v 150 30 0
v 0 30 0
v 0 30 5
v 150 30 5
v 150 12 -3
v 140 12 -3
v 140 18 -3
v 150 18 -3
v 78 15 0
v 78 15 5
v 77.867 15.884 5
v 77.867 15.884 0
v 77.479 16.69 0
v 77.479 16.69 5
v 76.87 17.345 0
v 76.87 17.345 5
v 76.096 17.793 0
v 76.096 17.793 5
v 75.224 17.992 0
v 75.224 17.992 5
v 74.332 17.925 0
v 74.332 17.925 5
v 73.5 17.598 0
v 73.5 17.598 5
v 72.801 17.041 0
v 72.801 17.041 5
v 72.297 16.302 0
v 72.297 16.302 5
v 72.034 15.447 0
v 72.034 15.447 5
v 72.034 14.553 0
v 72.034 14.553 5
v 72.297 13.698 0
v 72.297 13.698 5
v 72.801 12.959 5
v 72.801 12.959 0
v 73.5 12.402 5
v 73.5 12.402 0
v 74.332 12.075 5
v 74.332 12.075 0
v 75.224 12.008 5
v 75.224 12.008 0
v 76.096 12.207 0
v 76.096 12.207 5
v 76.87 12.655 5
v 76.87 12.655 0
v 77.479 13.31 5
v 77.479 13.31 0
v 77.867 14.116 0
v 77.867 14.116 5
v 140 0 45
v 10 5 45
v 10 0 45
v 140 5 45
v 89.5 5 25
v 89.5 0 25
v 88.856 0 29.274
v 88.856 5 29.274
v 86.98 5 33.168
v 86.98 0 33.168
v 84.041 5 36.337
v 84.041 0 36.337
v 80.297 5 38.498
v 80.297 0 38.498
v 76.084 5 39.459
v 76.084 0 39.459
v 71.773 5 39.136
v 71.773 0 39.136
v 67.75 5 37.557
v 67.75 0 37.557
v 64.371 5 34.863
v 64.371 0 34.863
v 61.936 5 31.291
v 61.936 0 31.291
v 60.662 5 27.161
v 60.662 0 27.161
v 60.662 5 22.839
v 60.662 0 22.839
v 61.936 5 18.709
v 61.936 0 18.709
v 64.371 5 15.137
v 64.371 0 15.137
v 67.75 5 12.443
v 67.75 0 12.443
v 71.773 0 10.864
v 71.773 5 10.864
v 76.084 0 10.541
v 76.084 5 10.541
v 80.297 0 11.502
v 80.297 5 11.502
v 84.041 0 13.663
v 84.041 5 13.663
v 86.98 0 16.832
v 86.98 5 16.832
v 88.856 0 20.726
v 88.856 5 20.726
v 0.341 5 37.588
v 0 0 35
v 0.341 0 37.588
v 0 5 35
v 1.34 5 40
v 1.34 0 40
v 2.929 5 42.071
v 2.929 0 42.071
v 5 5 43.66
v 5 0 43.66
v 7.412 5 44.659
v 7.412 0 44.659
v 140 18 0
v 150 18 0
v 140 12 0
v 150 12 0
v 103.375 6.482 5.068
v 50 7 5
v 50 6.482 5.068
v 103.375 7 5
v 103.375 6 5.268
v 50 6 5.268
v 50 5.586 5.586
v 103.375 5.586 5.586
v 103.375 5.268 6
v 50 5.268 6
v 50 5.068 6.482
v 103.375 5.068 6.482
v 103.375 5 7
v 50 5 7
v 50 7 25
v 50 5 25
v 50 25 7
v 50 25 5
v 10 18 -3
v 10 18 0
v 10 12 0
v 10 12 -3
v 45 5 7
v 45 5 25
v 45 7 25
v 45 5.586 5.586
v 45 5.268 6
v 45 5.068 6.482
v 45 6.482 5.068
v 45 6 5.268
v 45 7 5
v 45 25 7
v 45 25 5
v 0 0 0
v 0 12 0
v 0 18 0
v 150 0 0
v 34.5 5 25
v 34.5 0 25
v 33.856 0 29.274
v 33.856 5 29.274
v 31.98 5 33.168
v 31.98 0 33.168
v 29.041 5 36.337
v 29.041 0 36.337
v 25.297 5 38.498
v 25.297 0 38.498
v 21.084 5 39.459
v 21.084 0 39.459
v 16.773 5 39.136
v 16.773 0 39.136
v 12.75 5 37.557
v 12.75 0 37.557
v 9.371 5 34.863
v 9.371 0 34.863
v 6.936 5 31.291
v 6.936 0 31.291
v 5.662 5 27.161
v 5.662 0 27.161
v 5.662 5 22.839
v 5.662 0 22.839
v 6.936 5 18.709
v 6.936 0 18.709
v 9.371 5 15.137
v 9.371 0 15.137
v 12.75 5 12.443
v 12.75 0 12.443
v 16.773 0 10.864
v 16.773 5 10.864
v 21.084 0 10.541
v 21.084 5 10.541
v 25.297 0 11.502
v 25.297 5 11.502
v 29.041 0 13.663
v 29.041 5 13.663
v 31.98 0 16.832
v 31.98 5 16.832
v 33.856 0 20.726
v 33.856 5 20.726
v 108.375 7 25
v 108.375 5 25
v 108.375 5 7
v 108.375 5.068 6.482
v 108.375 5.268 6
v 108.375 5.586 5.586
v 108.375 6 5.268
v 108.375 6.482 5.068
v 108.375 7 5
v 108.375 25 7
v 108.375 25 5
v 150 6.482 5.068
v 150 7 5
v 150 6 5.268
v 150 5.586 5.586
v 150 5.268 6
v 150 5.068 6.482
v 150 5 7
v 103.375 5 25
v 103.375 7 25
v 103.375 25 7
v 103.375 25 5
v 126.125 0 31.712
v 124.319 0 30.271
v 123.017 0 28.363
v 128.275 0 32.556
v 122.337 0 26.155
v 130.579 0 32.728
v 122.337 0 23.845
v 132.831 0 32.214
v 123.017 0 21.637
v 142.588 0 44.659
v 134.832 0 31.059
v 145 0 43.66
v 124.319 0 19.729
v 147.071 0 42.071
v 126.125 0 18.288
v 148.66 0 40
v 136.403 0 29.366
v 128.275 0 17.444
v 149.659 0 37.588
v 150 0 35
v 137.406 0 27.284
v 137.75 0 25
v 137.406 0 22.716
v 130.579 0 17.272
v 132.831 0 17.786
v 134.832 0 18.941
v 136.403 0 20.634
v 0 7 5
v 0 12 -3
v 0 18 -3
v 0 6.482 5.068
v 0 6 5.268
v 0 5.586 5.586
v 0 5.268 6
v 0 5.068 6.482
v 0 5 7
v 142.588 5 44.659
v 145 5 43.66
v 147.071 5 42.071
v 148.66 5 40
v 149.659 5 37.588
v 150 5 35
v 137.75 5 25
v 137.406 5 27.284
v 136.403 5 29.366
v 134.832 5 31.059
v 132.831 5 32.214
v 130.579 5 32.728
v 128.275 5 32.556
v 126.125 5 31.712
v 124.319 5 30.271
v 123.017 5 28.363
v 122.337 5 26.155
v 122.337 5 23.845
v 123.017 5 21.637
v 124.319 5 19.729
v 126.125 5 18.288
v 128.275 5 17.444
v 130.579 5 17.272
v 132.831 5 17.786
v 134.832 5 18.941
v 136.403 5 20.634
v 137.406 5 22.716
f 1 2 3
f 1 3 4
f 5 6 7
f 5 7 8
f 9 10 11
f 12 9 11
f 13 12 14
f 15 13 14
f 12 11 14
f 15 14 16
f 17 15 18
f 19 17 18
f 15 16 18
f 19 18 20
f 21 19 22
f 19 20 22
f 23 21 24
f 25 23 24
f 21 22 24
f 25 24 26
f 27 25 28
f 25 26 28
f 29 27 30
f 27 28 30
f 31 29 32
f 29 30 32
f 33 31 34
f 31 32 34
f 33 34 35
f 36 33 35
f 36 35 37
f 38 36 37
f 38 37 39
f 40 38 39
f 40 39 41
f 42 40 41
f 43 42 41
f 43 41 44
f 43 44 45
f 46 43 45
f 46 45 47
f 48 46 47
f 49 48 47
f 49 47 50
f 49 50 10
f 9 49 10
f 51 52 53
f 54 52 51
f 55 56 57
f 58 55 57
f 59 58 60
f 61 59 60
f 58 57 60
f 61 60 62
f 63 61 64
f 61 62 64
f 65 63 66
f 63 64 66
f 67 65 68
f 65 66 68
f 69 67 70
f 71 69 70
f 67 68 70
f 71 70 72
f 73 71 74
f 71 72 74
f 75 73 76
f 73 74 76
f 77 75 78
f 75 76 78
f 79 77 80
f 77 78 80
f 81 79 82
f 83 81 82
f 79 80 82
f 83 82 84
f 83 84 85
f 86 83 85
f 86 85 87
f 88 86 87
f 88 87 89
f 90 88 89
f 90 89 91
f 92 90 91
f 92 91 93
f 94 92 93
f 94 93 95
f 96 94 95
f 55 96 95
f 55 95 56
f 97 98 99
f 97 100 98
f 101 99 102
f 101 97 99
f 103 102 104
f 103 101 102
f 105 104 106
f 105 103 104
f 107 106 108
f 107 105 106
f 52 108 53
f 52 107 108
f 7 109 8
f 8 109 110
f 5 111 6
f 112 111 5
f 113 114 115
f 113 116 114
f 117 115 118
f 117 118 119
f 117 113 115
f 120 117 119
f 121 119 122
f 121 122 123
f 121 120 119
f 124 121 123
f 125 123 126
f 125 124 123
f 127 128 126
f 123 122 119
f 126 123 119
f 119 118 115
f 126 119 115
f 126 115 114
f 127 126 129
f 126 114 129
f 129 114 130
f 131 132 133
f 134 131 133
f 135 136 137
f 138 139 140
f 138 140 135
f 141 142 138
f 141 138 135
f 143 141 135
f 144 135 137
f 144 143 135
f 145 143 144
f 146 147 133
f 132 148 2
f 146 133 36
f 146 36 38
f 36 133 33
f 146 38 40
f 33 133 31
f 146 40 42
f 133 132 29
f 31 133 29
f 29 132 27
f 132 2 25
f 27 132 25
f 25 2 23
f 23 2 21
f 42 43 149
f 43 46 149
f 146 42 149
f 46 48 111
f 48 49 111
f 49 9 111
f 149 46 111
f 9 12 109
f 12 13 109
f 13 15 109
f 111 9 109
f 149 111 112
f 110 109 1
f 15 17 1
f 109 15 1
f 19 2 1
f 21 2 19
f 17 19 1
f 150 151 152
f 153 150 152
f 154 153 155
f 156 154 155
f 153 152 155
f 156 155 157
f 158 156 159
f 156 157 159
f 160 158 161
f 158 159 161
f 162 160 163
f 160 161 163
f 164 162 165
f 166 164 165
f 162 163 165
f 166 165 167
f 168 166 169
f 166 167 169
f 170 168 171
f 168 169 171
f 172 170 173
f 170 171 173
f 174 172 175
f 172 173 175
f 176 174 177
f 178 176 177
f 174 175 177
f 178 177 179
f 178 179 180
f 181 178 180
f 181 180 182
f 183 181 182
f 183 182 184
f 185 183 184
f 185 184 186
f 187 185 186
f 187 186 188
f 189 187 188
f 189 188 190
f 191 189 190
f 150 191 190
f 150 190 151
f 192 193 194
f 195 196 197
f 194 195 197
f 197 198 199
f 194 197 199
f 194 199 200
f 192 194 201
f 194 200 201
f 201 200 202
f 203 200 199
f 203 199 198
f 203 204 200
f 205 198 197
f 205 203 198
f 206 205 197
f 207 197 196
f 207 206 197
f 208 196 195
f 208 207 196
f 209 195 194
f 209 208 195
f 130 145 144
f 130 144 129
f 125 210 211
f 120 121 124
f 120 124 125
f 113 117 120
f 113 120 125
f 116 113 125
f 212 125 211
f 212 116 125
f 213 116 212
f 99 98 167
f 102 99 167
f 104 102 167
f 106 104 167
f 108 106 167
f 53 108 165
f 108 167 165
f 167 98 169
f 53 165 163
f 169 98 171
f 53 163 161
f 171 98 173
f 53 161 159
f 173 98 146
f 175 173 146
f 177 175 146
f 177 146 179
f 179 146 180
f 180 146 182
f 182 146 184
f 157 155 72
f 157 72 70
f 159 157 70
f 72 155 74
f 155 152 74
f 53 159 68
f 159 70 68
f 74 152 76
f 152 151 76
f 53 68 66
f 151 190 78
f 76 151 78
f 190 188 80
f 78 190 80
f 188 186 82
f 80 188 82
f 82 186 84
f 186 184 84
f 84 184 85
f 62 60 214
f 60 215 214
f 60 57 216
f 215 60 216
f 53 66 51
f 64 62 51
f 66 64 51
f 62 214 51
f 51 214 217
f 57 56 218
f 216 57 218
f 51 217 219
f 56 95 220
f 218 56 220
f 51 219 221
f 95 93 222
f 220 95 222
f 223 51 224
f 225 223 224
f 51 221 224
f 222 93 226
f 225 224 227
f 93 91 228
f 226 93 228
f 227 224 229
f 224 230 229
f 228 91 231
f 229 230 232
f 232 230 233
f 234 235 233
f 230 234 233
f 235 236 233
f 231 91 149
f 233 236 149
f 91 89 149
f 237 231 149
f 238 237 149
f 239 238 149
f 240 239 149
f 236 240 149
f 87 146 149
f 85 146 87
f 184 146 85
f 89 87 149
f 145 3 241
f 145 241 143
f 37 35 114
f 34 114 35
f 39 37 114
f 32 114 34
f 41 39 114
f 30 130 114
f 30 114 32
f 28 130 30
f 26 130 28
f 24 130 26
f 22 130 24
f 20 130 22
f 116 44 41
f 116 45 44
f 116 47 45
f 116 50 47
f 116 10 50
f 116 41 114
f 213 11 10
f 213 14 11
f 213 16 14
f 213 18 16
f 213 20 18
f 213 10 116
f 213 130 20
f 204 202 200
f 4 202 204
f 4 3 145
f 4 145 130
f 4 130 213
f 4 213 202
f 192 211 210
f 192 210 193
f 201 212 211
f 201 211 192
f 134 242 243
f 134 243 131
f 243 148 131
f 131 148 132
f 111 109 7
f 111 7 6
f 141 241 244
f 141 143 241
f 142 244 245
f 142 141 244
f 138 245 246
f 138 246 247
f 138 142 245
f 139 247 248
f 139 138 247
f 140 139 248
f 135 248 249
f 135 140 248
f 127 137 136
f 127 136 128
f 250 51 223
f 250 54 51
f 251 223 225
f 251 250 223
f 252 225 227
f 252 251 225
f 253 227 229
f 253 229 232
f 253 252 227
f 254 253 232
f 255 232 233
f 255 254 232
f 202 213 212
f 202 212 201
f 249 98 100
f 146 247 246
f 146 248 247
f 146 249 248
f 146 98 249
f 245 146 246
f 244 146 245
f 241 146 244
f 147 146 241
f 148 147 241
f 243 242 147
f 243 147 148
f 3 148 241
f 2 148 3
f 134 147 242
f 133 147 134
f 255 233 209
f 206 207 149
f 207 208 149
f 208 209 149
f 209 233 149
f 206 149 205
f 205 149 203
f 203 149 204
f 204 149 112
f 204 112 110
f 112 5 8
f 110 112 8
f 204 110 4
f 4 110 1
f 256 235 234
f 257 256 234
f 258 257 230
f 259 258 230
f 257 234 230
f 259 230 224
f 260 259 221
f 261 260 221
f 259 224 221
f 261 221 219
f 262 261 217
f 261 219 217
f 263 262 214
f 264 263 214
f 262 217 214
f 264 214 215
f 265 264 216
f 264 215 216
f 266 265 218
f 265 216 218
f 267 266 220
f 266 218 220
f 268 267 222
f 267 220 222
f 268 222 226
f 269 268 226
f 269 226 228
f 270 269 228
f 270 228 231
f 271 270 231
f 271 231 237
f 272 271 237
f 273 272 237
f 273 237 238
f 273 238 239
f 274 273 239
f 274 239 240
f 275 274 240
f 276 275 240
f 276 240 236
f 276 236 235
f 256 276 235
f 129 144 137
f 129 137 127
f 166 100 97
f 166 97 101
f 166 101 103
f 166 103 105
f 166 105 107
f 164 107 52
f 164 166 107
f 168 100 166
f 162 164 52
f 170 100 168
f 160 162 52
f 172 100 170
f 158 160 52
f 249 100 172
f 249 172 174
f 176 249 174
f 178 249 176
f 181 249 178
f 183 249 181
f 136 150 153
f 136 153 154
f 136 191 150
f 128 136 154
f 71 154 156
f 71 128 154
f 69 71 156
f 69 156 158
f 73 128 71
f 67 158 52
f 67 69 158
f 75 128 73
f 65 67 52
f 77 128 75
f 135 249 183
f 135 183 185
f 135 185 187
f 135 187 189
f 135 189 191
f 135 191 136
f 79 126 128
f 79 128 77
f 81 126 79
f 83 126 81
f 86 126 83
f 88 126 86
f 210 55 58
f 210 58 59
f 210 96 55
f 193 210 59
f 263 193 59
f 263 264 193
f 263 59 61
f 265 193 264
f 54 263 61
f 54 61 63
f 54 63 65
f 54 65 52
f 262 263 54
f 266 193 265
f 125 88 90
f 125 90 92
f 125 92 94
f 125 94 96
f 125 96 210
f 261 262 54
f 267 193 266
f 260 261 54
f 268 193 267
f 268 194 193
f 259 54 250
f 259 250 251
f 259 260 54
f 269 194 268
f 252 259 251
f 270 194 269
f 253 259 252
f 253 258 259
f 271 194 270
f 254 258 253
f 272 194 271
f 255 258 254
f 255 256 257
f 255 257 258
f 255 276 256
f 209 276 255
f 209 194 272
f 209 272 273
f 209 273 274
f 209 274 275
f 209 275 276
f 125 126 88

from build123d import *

# Parameters (mm, degrees)
SKETCH_W        = 150
SKETCH_H        = 30
PAD_DEPTH       = 5
SKETCH001_W     = 150
SKETCH001_H     = 5
PAD001_DEPTH    = 40
SKETCH002_R     = 14.5
SKETCH002_R_2   = 7.75
POCKET_DEPTH    = 30.001
FILLET_R        = 10
SKETCH003_W     = 10
SKETCH003_H     = 6
PAD002_DEPTH    = 3
SKETCH004_R     = 3
POCKET001_DEPTH = 8.001
SKETCH005_W     = 5
SKETCH005_H     = 20
PAD003_DEPTH    = 20
CHAMFER_SIZE    = 18
FILLET001_R     = 2


with BuildPart() as part:
    # Sketch → Pad (new body)
    with BuildSketch(Plane.XY):
        with Locations((75, 15)):
            Rectangle(SKETCH_W, SKETCH_H)
    extrude(amount=PAD_DEPTH)

    # Sketch001 (on Face6 of Pad) → Pad001 (join)
    with BuildSketch(Plane.XY.offset(5)):
        with Locations((75, 2.5)):
            Rectangle(SKETCH001_W, SKETCH001_H)
    extrude(amount=PAD001_DEPTH)

    # Sketch002 (on Face5 of Pad001) → Pocket (cut, through all)
    with BuildSketch(Plane.XZ):
        with Locations((20, 25)):
            Circle(SKETCH002_R)
        with Locations((75, 25)):
            Circle(SKETCH002_R)
        with Locations((130, 25)):
            Circle(SKETCH002_R_2)
    extrude(amount=-POCKET_DEPTH, mode=Mode.SUBTRACT)

    # Fillet
    fillet_edges = [part.edges().sort_by_distance(p)[0] for p in [
        (150, 2.5, 45),
        (0, 2.5, 45),
    ]]
    fillet(fillet_edges, radius=FILLET_R)

    # Sketch003 → Pad002 (join)
    with BuildSketch(Plane(origin=(0, 0, 0), x_dir=(1, 0, 0), z_dir=(0, 0, -1))):
        with Locations((5, -15)):
            Rectangle(SKETCH003_W, SKETCH003_H)
        with Locations((145, -15)):
            Rectangle(SKETCH003_W, SKETCH003_H)
    extrude(amount=PAD002_DEPTH)

    # Sketch004 (on Face15 of Pad002) → Pocket001 (cut, through all)
    with BuildSketch(Plane.XY.offset(5)):
        with Locations((75, 15)):
            Circle(SKETCH004_R)
    extrude(amount=-POCKET001_DEPTH, mode=Mode.SUBTRACT)

    # Sketch005 (on Face15 of Pocket001) → Pad003 (join)
    with BuildSketch(Plane.XY.offset(5)):
        with Locations((47.5, 15)):
            Rectangle(SKETCH005_W, SKETCH005_H)
        with Locations((105.875, 15)):
            Rectangle(SKETCH005_W, SKETCH005_H)
    extrude(amount=PAD003_DEPTH)

    # Chamfer
    chamfer_edges = [part.edges().sort_by_distance(p)[0] for p in [
        (105.875, 25, 25),
        (47.5, 25, 25),
    ]]
    chamfer(chamfer_edges, length=CHAMFER_SIZE)

    # Fillet001
    fillet001_edges = [part.edges().sort_by_distance(p)[0] for p in [
        (129.1875, 5, 5),
        (76.6875, 5, 5),
        (22.5, 5, 5),
    ]]
    fillet(fillet001_edges, radius=FILLET001_R)


solid = part.part
